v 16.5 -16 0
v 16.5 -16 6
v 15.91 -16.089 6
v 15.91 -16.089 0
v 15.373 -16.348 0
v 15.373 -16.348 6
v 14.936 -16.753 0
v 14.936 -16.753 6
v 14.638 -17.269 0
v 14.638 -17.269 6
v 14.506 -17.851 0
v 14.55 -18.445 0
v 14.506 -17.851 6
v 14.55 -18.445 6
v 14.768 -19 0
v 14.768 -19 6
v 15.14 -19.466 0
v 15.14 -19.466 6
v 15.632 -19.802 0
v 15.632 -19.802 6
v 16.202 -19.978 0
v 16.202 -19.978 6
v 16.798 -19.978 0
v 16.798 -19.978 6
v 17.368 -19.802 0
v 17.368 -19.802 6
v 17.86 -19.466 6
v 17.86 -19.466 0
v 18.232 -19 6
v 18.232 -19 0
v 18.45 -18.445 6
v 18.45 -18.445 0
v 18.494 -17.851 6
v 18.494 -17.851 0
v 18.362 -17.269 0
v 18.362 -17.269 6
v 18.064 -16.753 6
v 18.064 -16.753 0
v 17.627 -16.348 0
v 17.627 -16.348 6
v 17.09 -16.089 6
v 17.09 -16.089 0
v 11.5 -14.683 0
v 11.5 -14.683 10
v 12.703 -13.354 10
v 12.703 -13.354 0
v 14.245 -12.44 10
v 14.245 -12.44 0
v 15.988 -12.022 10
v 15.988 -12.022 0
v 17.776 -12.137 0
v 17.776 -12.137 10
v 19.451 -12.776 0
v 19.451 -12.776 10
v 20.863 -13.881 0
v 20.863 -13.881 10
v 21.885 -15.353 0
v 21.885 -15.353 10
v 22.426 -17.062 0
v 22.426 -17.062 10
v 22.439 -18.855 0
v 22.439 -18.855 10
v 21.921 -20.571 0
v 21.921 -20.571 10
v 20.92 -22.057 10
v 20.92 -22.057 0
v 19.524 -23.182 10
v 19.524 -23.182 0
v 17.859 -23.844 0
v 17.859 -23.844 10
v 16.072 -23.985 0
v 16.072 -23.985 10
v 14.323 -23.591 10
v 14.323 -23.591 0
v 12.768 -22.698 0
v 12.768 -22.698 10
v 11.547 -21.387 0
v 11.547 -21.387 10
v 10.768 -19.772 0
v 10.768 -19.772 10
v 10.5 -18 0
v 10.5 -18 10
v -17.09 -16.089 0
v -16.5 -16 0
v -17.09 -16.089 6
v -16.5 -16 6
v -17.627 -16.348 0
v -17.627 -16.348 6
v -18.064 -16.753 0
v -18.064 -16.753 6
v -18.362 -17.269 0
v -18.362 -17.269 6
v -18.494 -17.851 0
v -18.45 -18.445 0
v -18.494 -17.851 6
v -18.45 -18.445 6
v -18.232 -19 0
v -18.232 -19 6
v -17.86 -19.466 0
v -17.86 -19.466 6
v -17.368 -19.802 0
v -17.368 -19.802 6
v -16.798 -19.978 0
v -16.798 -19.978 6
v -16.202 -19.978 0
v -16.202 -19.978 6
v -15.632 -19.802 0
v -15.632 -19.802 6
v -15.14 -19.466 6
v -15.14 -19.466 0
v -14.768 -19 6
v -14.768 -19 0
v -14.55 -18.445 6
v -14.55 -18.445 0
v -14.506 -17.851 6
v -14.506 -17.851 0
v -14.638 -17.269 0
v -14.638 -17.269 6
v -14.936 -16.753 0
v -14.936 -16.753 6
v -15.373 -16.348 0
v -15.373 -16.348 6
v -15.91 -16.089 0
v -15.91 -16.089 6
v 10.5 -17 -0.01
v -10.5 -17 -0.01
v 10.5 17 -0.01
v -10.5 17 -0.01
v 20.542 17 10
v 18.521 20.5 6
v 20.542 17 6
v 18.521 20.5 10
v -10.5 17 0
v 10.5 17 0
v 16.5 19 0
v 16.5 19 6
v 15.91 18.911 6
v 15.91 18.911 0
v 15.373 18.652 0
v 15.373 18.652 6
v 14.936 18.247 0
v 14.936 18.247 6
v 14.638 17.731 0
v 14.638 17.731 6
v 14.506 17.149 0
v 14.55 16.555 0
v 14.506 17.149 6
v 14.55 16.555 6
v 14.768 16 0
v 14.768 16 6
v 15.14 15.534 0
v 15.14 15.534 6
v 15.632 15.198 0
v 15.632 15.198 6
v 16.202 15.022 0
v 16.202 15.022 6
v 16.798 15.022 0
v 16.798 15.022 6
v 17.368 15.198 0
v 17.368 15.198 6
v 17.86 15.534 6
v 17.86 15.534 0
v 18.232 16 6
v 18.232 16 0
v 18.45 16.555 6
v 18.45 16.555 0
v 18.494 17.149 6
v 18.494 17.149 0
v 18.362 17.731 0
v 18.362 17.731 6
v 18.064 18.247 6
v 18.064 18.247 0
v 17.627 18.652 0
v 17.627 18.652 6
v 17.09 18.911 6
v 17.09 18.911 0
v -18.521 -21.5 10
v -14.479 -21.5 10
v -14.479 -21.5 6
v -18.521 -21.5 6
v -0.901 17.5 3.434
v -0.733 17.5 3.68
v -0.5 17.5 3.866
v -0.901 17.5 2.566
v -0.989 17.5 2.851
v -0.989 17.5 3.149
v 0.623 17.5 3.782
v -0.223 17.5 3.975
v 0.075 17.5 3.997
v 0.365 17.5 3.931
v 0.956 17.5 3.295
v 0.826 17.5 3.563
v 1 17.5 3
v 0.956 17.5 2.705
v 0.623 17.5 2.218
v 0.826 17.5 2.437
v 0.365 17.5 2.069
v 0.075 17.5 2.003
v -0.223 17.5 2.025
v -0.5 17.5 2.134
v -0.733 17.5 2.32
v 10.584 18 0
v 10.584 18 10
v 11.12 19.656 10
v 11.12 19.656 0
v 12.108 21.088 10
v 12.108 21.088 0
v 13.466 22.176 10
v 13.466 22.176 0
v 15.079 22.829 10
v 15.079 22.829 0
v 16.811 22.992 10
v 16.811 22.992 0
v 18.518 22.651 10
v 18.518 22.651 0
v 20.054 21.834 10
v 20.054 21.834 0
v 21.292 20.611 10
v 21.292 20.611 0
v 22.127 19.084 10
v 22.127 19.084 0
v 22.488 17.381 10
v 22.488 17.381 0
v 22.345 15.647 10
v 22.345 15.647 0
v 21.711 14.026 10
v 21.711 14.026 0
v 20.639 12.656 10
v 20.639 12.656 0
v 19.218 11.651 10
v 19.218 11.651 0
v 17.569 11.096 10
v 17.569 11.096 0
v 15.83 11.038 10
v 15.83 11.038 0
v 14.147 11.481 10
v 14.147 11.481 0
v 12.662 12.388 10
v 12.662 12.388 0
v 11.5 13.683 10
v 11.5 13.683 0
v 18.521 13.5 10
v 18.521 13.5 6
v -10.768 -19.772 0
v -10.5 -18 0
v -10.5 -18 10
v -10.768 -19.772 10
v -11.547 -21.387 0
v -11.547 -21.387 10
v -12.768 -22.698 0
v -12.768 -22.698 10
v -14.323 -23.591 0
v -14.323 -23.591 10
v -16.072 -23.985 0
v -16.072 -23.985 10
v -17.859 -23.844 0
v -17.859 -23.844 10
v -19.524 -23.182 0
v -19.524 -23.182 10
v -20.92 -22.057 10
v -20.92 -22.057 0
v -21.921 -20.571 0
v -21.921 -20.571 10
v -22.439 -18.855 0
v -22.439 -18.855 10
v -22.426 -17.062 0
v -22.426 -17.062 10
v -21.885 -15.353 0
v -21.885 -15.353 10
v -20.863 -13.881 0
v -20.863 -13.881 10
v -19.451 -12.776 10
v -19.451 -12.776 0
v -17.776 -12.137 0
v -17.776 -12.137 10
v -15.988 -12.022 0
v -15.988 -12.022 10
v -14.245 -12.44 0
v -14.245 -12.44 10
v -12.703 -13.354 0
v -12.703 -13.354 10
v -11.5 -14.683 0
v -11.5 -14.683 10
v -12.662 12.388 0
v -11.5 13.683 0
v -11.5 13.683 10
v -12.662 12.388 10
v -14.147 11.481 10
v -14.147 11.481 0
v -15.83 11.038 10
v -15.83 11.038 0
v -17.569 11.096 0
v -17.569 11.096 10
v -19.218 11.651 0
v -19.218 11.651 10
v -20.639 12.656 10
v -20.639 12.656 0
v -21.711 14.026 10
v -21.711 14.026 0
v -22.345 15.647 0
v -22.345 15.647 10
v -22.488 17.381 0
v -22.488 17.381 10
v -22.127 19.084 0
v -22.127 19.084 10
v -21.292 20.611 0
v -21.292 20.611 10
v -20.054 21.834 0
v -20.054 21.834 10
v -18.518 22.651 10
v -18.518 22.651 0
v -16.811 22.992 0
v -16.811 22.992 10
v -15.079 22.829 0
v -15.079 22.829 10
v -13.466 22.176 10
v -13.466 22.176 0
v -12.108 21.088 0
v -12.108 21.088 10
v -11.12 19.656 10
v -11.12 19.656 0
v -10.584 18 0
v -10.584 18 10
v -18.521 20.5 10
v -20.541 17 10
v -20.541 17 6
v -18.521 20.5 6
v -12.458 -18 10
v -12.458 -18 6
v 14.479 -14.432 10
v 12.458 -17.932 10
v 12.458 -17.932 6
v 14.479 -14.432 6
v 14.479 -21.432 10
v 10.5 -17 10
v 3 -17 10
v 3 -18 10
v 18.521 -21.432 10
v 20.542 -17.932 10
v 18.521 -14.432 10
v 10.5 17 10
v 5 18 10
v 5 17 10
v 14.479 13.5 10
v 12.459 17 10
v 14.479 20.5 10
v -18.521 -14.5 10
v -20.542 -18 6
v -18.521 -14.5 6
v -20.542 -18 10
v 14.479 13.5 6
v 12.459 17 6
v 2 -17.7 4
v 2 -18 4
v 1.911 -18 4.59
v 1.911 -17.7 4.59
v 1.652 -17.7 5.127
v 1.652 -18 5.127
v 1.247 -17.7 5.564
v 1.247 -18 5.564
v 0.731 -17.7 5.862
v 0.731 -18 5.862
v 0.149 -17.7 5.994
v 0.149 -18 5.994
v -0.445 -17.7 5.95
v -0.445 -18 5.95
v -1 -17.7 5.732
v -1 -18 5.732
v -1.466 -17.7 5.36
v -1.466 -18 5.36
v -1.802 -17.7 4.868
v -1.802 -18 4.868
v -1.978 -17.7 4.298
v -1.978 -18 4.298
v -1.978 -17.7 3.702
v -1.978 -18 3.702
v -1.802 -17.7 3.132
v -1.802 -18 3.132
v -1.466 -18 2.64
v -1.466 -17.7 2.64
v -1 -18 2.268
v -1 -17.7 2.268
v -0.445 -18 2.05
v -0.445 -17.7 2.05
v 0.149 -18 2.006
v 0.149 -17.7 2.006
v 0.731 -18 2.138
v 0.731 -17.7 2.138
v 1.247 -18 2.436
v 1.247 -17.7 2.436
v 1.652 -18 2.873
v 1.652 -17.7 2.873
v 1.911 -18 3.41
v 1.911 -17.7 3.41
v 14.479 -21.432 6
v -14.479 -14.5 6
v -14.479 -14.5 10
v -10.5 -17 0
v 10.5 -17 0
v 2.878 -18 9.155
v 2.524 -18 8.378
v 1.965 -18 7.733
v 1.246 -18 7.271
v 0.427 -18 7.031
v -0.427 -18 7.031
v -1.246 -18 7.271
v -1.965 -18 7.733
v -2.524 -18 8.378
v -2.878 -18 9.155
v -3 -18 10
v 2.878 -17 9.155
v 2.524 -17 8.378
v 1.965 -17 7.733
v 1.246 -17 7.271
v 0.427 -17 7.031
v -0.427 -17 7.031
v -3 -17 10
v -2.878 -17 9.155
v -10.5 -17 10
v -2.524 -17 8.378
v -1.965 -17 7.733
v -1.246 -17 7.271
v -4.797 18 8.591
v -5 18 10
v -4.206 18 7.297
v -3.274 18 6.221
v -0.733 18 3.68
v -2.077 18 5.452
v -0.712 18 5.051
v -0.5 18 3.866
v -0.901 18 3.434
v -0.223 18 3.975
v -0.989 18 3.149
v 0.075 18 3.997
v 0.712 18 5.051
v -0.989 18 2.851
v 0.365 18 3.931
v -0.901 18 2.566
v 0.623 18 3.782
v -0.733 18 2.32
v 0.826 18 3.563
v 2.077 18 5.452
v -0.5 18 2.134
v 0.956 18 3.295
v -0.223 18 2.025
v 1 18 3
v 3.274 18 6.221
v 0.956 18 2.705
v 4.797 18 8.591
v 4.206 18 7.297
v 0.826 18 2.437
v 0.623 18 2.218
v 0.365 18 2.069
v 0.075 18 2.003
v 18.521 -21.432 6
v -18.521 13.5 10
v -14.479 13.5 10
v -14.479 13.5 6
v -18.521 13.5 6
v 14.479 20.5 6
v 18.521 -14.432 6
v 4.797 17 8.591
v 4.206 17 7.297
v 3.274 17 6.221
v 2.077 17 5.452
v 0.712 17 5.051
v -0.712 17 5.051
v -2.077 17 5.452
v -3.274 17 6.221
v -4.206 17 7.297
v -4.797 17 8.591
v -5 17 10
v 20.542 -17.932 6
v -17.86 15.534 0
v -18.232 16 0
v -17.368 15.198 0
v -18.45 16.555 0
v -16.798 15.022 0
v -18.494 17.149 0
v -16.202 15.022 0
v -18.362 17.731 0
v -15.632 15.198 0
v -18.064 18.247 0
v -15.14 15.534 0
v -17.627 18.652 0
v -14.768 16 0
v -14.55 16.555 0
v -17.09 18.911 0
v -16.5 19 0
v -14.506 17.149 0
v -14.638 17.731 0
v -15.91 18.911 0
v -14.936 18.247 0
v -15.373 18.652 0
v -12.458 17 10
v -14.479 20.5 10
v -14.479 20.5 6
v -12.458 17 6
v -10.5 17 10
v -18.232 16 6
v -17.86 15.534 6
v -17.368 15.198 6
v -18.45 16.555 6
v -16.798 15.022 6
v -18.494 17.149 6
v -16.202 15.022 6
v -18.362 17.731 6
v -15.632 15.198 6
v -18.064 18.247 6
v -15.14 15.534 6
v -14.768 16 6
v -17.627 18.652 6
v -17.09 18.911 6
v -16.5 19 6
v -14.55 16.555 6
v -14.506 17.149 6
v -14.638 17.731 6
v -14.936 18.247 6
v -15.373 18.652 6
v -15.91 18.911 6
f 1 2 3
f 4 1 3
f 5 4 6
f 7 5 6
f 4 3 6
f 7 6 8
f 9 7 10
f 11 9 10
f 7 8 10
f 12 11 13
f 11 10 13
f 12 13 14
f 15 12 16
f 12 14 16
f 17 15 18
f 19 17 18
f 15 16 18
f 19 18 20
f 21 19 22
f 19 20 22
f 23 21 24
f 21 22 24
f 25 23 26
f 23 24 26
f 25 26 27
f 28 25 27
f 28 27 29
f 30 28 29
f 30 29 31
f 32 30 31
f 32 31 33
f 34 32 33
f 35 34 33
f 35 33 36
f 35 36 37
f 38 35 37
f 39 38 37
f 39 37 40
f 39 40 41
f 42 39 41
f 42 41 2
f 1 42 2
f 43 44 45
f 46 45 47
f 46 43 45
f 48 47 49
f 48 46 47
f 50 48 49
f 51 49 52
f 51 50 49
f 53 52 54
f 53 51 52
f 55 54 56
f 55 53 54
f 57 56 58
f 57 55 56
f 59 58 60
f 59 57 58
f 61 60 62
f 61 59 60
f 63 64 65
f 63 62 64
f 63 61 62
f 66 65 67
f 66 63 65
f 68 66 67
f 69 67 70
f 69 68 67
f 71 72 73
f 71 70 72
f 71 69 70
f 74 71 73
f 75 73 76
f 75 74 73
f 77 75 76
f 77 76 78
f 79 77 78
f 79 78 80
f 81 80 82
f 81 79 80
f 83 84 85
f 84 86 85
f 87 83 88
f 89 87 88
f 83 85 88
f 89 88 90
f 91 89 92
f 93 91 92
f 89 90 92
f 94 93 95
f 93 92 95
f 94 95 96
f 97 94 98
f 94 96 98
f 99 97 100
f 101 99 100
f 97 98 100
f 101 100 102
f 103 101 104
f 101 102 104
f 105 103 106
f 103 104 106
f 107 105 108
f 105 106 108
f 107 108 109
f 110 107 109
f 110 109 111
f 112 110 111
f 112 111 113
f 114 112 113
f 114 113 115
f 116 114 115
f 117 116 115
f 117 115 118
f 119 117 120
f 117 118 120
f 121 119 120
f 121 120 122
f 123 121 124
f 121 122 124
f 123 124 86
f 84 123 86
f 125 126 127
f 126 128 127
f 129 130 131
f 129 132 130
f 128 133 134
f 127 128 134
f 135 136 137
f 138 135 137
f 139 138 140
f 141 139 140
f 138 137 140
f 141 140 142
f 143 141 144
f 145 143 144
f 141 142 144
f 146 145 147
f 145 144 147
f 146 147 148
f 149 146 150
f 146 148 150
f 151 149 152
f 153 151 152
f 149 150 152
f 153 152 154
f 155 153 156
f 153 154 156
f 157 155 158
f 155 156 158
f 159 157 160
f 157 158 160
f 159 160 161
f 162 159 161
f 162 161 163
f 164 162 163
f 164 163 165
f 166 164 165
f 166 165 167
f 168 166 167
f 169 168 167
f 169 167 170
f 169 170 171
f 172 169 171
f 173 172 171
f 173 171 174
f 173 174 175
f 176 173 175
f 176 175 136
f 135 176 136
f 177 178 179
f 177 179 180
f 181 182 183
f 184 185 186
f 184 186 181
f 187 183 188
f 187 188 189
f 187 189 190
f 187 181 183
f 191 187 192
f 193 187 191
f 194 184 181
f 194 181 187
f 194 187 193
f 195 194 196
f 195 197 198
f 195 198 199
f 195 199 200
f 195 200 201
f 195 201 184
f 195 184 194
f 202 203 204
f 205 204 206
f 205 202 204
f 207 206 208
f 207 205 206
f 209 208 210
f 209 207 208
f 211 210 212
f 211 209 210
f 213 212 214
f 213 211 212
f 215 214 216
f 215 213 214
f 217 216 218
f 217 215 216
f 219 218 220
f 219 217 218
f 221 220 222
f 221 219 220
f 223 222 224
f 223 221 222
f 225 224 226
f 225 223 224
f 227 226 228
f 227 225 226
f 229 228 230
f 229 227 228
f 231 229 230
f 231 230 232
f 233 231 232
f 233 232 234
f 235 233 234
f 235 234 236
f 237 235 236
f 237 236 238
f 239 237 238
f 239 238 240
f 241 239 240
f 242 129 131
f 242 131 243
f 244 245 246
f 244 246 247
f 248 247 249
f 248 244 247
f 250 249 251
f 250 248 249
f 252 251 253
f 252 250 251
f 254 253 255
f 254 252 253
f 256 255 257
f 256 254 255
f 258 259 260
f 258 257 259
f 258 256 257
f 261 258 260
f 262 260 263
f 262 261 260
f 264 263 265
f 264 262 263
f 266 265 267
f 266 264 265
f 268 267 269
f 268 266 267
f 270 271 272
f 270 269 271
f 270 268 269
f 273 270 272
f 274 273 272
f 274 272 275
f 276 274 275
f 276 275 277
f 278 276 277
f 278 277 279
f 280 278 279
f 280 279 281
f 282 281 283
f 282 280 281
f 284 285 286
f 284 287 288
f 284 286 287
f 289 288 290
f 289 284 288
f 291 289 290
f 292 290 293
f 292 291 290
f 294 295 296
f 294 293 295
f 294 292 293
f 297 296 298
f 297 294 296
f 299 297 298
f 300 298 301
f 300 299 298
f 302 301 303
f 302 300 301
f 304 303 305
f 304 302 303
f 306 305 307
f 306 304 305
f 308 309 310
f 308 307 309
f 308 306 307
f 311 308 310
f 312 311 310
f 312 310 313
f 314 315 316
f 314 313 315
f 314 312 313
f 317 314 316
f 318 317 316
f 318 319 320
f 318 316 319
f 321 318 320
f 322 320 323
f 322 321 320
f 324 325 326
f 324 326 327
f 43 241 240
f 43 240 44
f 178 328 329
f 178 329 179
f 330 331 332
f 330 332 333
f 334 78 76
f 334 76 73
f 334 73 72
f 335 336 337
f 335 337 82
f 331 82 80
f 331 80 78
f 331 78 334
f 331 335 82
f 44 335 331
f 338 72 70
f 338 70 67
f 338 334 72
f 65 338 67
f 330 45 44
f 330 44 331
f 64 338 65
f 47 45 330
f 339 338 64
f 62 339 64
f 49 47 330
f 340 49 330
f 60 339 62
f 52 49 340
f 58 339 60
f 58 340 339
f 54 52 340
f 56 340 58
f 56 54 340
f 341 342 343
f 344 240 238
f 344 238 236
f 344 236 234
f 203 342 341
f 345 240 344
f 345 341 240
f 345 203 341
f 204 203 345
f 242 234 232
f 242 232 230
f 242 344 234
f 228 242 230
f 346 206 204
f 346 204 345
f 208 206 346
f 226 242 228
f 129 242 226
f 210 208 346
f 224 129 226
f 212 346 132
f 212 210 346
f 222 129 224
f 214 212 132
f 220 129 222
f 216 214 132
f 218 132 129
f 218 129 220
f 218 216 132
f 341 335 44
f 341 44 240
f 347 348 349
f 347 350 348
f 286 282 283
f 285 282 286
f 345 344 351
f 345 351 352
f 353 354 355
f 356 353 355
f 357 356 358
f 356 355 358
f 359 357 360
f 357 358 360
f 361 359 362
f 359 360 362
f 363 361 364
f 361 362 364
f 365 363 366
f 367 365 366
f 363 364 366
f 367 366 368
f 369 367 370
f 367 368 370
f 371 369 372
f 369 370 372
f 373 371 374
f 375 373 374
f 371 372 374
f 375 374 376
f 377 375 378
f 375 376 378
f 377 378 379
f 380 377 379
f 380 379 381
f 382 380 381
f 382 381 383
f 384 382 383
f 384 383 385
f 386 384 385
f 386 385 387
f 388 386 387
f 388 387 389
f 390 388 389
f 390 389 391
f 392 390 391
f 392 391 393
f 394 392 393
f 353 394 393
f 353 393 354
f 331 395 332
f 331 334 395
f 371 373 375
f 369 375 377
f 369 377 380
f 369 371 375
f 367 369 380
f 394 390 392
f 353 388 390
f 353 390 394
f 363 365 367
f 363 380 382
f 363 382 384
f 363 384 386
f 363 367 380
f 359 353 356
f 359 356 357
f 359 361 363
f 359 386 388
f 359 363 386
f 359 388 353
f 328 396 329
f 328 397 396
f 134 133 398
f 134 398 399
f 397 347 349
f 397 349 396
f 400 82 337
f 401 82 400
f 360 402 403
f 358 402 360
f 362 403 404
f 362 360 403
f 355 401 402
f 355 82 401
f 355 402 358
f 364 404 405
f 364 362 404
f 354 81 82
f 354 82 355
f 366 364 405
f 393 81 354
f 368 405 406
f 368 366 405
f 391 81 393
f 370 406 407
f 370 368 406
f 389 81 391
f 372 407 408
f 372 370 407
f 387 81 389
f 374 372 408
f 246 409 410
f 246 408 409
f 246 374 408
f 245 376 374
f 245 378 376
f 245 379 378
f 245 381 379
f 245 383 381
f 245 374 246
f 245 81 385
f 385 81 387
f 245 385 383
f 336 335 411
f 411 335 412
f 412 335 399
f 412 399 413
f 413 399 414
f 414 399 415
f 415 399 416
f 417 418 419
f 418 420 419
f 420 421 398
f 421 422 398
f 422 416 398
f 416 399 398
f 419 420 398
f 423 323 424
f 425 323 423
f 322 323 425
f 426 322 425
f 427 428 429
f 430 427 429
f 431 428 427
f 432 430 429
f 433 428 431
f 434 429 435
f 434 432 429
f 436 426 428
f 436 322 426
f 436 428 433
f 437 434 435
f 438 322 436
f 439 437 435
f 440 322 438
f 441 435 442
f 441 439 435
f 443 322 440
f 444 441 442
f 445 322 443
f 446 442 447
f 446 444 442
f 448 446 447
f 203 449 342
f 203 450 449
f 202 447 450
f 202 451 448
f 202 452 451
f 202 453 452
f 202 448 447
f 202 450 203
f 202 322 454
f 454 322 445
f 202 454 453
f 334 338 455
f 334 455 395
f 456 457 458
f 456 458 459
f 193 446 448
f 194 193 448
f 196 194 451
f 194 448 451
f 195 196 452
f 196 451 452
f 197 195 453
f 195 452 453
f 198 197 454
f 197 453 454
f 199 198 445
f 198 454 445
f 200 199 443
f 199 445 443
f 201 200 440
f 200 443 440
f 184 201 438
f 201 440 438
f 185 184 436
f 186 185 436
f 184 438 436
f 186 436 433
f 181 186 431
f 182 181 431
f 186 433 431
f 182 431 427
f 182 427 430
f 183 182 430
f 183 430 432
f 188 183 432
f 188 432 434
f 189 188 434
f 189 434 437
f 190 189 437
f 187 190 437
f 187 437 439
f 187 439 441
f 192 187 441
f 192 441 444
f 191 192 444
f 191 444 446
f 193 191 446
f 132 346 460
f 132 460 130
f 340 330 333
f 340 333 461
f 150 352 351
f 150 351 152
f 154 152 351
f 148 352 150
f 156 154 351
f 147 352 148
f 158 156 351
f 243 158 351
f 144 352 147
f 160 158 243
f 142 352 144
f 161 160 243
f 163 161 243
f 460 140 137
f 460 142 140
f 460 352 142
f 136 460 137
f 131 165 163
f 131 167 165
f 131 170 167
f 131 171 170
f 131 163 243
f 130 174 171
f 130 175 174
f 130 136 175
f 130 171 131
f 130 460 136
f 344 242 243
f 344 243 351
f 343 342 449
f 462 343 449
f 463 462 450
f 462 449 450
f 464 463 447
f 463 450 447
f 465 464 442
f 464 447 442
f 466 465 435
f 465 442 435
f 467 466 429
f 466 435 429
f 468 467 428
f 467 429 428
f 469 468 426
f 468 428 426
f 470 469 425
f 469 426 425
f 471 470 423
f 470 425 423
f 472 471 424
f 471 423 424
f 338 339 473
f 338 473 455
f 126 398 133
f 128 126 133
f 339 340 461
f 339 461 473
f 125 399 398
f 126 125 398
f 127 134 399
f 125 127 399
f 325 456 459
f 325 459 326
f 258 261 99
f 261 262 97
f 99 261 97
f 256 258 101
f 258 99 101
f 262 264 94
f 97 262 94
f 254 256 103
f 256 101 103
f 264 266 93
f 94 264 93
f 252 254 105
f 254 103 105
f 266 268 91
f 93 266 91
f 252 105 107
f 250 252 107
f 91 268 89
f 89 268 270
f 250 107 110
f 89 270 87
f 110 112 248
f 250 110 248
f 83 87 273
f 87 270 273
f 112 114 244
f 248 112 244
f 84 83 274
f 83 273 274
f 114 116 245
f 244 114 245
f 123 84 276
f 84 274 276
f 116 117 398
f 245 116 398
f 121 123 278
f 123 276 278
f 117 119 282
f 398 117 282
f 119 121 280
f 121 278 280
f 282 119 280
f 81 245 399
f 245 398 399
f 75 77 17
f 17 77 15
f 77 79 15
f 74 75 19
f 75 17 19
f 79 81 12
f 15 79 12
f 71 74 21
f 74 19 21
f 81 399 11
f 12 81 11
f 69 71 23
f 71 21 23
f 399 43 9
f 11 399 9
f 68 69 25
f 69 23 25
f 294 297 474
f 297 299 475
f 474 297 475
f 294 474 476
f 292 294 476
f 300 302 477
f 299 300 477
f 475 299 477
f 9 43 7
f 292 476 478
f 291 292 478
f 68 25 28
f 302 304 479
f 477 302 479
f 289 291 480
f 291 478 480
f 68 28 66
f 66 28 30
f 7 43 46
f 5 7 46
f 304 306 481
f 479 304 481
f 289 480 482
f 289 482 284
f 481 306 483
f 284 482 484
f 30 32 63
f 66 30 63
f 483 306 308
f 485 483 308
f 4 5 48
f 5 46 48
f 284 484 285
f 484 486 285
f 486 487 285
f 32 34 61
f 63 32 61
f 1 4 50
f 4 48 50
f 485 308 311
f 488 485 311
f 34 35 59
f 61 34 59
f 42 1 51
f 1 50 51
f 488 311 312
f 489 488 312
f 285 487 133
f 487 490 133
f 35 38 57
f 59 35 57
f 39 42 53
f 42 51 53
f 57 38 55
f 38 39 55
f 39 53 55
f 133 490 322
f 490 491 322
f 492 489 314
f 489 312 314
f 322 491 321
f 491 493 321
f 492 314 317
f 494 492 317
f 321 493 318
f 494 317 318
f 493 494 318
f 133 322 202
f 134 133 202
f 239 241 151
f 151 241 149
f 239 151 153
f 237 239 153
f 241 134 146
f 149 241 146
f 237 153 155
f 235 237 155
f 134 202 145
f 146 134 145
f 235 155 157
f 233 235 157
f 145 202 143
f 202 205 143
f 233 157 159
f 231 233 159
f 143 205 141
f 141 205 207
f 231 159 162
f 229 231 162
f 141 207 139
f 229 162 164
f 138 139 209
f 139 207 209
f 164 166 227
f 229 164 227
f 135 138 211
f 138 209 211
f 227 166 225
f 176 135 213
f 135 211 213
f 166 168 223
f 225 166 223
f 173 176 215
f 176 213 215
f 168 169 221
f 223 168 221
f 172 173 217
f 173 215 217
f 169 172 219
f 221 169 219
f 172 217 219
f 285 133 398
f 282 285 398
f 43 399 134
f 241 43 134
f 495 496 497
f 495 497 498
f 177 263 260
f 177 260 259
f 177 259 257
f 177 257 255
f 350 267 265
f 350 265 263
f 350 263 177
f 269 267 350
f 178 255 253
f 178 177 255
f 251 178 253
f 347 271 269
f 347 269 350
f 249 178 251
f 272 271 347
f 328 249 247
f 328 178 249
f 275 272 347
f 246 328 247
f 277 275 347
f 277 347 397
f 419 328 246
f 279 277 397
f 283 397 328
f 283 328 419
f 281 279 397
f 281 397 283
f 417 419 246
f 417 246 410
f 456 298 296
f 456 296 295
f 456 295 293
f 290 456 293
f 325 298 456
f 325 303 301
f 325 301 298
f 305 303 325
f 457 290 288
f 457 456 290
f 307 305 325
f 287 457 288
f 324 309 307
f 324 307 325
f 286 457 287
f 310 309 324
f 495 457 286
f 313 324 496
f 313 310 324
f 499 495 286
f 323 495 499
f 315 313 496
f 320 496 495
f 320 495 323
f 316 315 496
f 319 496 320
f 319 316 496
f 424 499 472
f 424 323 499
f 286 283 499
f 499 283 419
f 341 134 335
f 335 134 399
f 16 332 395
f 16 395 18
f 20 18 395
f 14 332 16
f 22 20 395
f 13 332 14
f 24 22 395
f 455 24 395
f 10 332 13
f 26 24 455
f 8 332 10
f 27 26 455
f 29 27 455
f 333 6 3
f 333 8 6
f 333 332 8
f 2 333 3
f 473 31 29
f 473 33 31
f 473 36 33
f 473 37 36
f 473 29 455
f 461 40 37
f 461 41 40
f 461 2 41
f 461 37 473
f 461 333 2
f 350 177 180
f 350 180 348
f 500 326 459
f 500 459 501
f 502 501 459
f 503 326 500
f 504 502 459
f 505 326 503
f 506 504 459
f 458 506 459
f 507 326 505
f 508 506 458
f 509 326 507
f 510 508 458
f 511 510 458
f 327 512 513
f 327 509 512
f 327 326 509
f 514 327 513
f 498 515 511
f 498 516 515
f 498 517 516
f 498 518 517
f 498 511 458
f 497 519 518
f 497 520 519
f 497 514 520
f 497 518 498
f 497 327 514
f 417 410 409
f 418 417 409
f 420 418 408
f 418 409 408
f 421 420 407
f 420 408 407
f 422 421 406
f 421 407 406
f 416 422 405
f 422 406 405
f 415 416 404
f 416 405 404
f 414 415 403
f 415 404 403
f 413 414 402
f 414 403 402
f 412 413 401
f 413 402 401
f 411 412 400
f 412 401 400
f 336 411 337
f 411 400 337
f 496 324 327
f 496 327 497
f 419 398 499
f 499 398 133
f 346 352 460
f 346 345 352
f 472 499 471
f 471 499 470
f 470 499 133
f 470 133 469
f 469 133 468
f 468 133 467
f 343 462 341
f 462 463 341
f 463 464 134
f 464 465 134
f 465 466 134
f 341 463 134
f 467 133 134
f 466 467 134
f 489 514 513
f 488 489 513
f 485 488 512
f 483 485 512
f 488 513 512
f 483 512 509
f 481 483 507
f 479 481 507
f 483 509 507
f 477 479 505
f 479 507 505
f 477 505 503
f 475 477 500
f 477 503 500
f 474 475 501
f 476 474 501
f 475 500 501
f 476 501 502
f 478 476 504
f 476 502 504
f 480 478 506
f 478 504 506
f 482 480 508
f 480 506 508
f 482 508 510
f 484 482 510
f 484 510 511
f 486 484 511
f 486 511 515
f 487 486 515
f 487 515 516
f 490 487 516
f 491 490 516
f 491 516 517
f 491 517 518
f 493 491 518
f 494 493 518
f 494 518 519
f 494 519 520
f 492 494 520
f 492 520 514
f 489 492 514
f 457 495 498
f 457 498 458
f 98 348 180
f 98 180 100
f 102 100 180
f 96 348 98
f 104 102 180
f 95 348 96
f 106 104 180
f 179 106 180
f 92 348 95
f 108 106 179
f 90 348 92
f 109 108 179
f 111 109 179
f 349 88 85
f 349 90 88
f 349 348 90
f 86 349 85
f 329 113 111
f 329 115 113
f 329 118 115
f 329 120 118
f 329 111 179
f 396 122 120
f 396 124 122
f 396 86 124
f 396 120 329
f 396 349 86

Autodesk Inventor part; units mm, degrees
ref_plane "YZ Plane" through (0, 0, 0) normal (1, 0, 0) x (0, 1, 0)
ref_plane "XZ Plane" through (0, 0, 0) normal (0, 1, 0) x (-1, 0, 0)
ref_plane "XY Plane" through (0, 0, 0) normal (0, 0, 1) x (1, 0, 0)
sketch "Sketch1" plane through (0, 0, 0) normal (0, 0, 1) x (1, 0, 0)
  line L0 (-31.5, 0) -> (31.5, 0) projected
  line L1 (0, -33.4) -> (0, 32.4) projected
  line L2 (-10.5, 17) -> (10.5, 17)
  line L3 (10.5, 17) -> (10.5, -17)
  line L4 (10.5, -17) -> (-10.5, -17)
  line L5 (-10.5, -17) -> (-10.5, 17)
  line L6 (-10.5, 17) -> (10.5, -17) construction
  line L7 (10.5, 17) -> (-10.5, -17) construction
  line L8 (-11.5, 18) -> (11.5, 18)
  line L9 (11.5, 18) -> (11.5, -18)
  line L10 (11.5, -18) -> (-11.5, -18)
  line L11 (-11.5, -18) -> (-11.5, 18)
  line L12 (-11.5, 18) -> (11.5, -18) construction
  line L13 (11.5, 18) -> (-11.5, -18) construction
  circle A0 centre (16.5, 17) radius 6
  circle A1 centre (16.5, -18) radius 6
  line L14 (18.5207, 13.5) -> (14.4793, 13.5)
  line L15 (14.4793, 13.5) -> (12.4585, 17)
  line L16 (12.4585, 17) -> (14.4793, 20.5)
  line L17 (14.4793, 20.5) -> (18.5207, 20.5)
  line L18 (18.5207, 20.5) -> (20.5415, 17)
  line L19 (20.5415, 17) -> (18.5207, 13.5)
  line L20 (18.5207, -21.5) -> (14.4793, -21.5)
  line L21 (14.4793, -21.5) -> (12.4585, -18)
  line L22 (12.4585, -18) -> (14.4793, -14.5)
  line L23 (14.4793, -14.5) -> (18.5207, -14.5)
  line L24 (18.5207, -14.5) -> (20.5415, -18)
  line L25 (20.5415, -18) -> (18.5207, -21.5)
  circle A2 centre (-16.5, -18) radius 6
  circle A3 centre (-16.5, 17) radius 6
  point P0 (0, 0)
  point P1 (-11.5, -14.6834)
  point P2 (-10.5, -18)
  point P3 (-10.5839, 18)
  point P4 (-11.5, 13.6834)
  dimension "d0" = 21
  dimension "d1" = 34
  dimension "d2" = 23
  dimension "d3" = 36
  dimension "d13" = 12
  dimension "d14" = 12
  dimension "d15" = 47
  dimension "d16" = 0
  dimension "d18" = 7
  dimension "d19" = 7
extrude "Extrusion1" add sketch "Sketch1" along normal blind 10 contours L11 A3 L5 L0 | L0 L5 L4 L1 L10 A2 L11 | A2 L10 L11 | L11 L8 A3 | A3 L8 L1 L2 | L3 A0 L9 L0 | L0 L9 A1 L10 L1 L4 L3 | L1 L8 A0 L2 | A0 L8 L9 | A1 L9 L10 picked at (-11.3172, -16.1332) picked at (-11.3172, 15.4666) picked at (11.3172, 15.4666) picked at (11.3172, -16.1332)
extrude "Extrusion2" add sketch "Sketch1" along normal blind 10 contours A0 L8 L9 | A0 L9 L8 | L14 L15 L16 L17 L18 L19
sketch "Sketch3" plane through (-11.5, -18, 10) normal (0, -1, 0) x (1, 0, 0)
  line L0 (23, 0) -> (0, 0) projected
  arc A0 (8.5, 0) -> (14.5, 0) centre (11.5, 0) ccw
  point P0 (11.5, -10)
  point P1 (14.5, 0)
  dimension "d36" = 3
  dimension "d108" = 6
extrude "Extrusion6" cut sketch "Sketch3" against normal up to surface (1 mm away)
sketch "Sketch4" plane through (-11.5, 18, 10) normal (0, 1, 0) x (1, 0, 0)
  arc A0 (14.5, 0) -> (8.5, 0) centre (11.5, 0) ccw projected
  line L0 (1, 0) -> (22, 0) projected
  arc A1 (16.5, 0) -> (6.5, 0) centre (11.5, 0) ccw
  point P0 (11.5, 10)
  point P1 (6.5, 0)
  dimension "d39" = 5
extrude "Extrusion7" cut sketch "Sketch4" against normal up to surface (1 mm away)
extrude "Extrusion8" add sketch "Sketch1" against normal blind 0.01 contours L5 L2 L1 L0 | L0 L1 L4 L5 | L1 L2 L3 L0 | L0 L3 L4 L1
hole "Hole2" at (16.5, 17, 0) direction (0, 0, 1) diameter 4 end through all
extrude "Extrusion10" add sketch "Sketch1" along normal blind 10 contours L11 L10 A2 picked at (-18.7986, -18.1791)
sketch "Sketch6" plane through (0, 0, 10) normal (0, 0, 1) x (1, 0, 0)
  line L0 (18.5207, 13.5) -> (14.4793, 13.5)
  line L1 (14.4793, 13.5) -> (12.4586, 17)
  line L2 (12.4586, 17) -> (14.4793, 20.5)
  line L3 (14.4793, 20.5) -> (18.5207, 20.5)
  line L4 (18.5207, 20.5) -> (20.5415, 17)
  line L5 (20.5415, 17) -> (18.5207, 13.5)
  line L6 (5, 17) -> (10.5, 17) projected
  point P0 (0, 0)
  point P1 (16.5, 17)
  dimension "d56" = 7
extrude "Extrusion11" cut sketch "Sketch6" against normal blind 4
extrude "Extrusion12" add sketch "Sketch1" along normal blind 10 contours A1 L9 L10 | L10 L9 A1 | L20 L21 L22 L23 L24 L25
hole "Hole3" at (16.5, -18, 0) direction (0, 0, 1) diameter 4 end through all
hole "Hole4" at (-16.5, -18, 0) direction (0, 0, 1) diameter 4 end through all
sketch "Sketch7" plane through (0, 0, 10) normal (0, 0, 1) x (1, 0, 0)
  line L0 (-14.4793, -21.5) -> (-18.5207, -21.5)
  line L1 (-18.5207, -21.5) -> (-20.5415, -18)
  line L2 (-20.5415, -18) -> (-18.5207, -14.5)
  line L3 (-18.5207, -14.5) -> (-14.4793, -14.5)
  line L4 (-14.4793, -14.5) -> (-12.4585, -18)
  line L5 (-12.4585, -18) -> (-14.4793, -21.5)
  line L6 (-10.5, -18) -> (-3, -18) projected
  line L7 (-10.5, 17) -> (-5, 17) projected
  point P0 (0, 0)
  point P1 (-16.5, -18)
  dimension "d75" = 7
  dimension "d78" = 31.5
  dimension "d79" = 19.7894
extrude "Extrusion13" add sketch "Sketch1" along normal blind 10 contours A3 L8 L11 picked at (-18.6587, 16.2674)
sketch "Sketch8" plane through (0, 0, 10) normal (0, 0, 1) x (1, 0, 0)
  point P0 (0, 0)
hole "Hole5" at (-16.5, 17, 0) direction (0, 0, 1) diameter 4 end through all
sketch "Sketch9" plane through (0, 0, 10) normal (0, 0, 1) x (1, 0, 0)
  line L0 (-14.4793, 13.5) -> (-18.5207, 13.5)
  line L1 (-18.5207, 13.5) -> (-20.5414, 17)
  line L2 (-20.5414, 17) -> (-18.5207, 20.5)
  line L3 (-18.5207, 20.5) -> (-14.4793, 20.5)
  line L4 (-14.4793, 20.5) -> (-12.4585, 17)
  line L5 (-12.4585, 17) -> (-14.4793, 13.5)
  line L6 (-10.5, 17) -> (-5, 17) projected
  point P0 (0, 0)
  point P1 (-16.5, 17)
  dimension "d89" = 7
  dimension "d90" = 2.2894
extrude "Extrusion14" cut sketch "Sketch9" against normal blind 4
extrude "Extrusion15" cut sketch "Sketch7" against normal blind 4
sketch "Sketch10" plane through (0, 0, 10) normal (0, 0, 1) x (1, 0, 0)
  line L0 (18.5207, -21.4318) -> (14.4793, -21.4318)
  line L1 (14.4793, -21.4318) -> (12.4585, -17.9318)
  line L2 (12.4585, -17.9318) -> (14.4793, -14.4318)
  line L3 (14.4793, -14.4318) -> (18.5207, -14.4318)
  line L4 (18.5207, -14.4318) -> (20.5415, -17.9318)
  line L5 (20.5415, -17.9318) -> (18.5207, -21.4318)
  line L6 (3, -18) -> (10.5, -18) projected
  arc A0 (11.5, 13.6834) -> (10.5839, 18) centre (16.5, 17) ccw projected
  point P0 (0, 0)
  point P1 (16.5, -17.9318)
  dimension "d95" = 7
  dimension "d96" = 34.9318
  dimension "d97" = 13.9659
extrude "Extrusion16" cut sketch "Sketch10" against normal blind 4
sketch "Sketch11" plane through (0, -18, 10) normal (0, -1, 0) x (1, 0, 0)
  circle A0 centre (0, -6) radius 2
  line L0 (-10.5, -10) -> (10.5, -10) projected
  arc A1 (-3, 0) -> (3, 0) centre (0, 0) ccw projected
  point P0 (0, -10)
  dimension "d100" = 4
  dimension "d101" = 2
  dimension "d109" = 1
extrude "Extrusion17" cut sketch "Sketch11" against normal blind 0.3
sketch "Sketch12" plane through (10.5839, 18, 10) normal (0, 1, 0) x (1, 0, 0)
  circle A0 centre (-10.5839, 7) radius 1
  line L0 (0, 10) -> (-21.1678, 10) projected
  point P0 (-10.5839, 10)
  dimension "d110" = 2
  dimension "d111" = 3
extrude "Extrusion18" cut sketch "Sketch12" against normal blind 0.5
properties part number "uchwyt_maly_silnik" material "PC/ABS Plastic"
